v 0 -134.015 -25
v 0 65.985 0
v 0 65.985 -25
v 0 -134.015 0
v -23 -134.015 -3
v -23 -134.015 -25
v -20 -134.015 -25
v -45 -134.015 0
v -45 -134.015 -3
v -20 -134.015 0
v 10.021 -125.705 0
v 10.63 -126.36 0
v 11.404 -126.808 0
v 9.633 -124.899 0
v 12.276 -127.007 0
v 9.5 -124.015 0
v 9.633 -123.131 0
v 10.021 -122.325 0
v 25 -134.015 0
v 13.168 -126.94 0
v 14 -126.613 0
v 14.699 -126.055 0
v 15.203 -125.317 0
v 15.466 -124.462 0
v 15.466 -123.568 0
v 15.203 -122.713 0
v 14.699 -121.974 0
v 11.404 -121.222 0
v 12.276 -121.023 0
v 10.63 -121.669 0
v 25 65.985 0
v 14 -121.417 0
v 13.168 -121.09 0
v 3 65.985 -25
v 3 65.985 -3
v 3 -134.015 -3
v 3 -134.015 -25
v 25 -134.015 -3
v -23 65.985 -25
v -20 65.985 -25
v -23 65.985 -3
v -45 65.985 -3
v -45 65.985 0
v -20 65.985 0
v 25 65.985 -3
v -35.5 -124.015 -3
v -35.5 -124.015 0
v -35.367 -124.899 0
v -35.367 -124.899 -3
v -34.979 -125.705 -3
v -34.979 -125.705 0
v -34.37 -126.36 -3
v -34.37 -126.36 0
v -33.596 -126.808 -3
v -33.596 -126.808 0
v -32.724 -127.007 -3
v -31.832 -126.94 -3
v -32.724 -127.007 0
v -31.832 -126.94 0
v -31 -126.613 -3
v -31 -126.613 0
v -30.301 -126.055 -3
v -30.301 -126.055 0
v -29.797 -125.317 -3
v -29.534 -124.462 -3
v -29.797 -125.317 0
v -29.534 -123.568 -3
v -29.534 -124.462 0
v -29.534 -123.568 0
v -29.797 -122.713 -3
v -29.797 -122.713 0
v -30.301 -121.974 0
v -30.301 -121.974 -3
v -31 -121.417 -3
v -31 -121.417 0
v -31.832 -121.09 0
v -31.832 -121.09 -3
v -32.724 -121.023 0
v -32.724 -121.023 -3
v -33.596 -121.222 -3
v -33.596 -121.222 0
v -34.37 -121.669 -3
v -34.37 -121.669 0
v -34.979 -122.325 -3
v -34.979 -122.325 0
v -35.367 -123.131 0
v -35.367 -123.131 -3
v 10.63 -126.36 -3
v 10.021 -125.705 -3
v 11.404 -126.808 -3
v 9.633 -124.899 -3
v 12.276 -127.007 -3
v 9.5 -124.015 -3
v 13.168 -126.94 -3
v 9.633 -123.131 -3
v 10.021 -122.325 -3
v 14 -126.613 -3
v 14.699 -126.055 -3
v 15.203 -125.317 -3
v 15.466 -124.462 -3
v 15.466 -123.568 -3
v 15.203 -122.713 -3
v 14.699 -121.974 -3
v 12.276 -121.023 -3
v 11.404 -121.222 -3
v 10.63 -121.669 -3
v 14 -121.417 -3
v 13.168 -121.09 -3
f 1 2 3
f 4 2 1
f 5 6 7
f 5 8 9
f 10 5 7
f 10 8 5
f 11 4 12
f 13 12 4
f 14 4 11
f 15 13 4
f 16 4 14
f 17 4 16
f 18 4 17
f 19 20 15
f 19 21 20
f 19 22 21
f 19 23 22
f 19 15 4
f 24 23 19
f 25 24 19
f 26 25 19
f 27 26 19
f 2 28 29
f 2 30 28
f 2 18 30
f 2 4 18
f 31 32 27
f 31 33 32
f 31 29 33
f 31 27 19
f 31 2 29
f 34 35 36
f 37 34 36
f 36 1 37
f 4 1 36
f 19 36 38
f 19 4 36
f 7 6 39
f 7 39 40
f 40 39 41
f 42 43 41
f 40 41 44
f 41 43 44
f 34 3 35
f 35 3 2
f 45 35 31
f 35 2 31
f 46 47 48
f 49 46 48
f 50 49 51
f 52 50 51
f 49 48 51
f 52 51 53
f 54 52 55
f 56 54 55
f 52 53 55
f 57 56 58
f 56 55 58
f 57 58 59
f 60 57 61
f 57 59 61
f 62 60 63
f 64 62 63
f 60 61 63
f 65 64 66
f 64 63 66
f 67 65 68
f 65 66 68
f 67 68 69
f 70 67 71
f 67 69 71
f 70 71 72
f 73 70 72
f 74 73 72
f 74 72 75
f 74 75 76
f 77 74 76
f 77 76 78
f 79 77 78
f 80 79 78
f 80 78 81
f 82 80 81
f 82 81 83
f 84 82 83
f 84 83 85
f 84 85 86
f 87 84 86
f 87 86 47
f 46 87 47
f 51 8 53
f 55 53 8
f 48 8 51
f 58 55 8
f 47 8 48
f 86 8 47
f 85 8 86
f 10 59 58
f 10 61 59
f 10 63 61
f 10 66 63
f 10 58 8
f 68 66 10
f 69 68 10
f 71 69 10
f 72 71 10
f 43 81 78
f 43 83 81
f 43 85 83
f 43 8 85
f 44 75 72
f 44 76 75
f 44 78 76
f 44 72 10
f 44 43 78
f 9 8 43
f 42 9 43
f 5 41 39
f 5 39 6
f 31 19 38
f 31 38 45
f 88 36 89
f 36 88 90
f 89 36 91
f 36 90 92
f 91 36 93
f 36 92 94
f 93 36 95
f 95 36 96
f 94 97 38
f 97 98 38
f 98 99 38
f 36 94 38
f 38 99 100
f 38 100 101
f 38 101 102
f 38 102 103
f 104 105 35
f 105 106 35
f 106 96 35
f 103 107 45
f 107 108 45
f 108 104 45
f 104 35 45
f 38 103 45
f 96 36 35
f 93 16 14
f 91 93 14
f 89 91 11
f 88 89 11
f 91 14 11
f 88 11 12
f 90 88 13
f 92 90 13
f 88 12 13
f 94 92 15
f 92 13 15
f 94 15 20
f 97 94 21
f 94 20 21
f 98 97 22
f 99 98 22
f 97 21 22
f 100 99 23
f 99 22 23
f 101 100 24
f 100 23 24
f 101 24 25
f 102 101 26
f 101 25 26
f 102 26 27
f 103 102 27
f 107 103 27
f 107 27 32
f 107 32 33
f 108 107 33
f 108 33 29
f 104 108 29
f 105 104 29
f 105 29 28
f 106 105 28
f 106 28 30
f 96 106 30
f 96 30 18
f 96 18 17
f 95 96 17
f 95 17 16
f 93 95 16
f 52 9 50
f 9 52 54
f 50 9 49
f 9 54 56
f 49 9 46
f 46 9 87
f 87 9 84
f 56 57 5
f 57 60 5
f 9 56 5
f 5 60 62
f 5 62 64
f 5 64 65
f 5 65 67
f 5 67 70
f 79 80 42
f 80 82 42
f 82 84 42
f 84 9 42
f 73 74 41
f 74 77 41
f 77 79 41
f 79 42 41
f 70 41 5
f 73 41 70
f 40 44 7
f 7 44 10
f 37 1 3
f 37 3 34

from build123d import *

# Parameters (mm, degrees)
F0_W     = 25
F0_H     = 200
F1_DEPTH = 3
F2_W     = 3
F2_H     = 200
F3_DEPTH = 22
F5_D     = 6
F5_DEPTH = 7


with BuildPart() as f1:
    # F0 (on Top) → F1 (new body)
    with BuildSketch(Plane.XY):
        with Locations((-32.5, -34.014946)):
            Rectangle(F0_W, F0_H)
        with Locations((12.5, -34.014946)):
            Rectangle(F0_W, F0_H)
    extrude(amount=-F1_DEPTH)

    # F2 (on face) → F3 (join)
    with BuildSketch(Plane(origin=(0, 0, -3), x_dir=(1, 0, 0), z_dir=(0, 0, -1))):
        with Locations((-21.5, 34.014946)):
            Rectangle(F2_W, F2_H)
        with Locations((1.5, 34.014946)):
            Rectangle(F2_W, F2_H)
    extrude(amount=F3_DEPTH)

    # F5
    with Locations(Plane(origin=(0, 0, -3), x_dir=(1, 0, 0), z_dir=(0, 0, -1))):
        with Locations((-32.5, 124.014946), (12.5, 124.014946)):
            Hole(F5_D / 2, depth=F5_DEPTH)


with BuildPart() as f6_1:
    # F6: copy of F1
    add(f1.part)


solid = f1.part
